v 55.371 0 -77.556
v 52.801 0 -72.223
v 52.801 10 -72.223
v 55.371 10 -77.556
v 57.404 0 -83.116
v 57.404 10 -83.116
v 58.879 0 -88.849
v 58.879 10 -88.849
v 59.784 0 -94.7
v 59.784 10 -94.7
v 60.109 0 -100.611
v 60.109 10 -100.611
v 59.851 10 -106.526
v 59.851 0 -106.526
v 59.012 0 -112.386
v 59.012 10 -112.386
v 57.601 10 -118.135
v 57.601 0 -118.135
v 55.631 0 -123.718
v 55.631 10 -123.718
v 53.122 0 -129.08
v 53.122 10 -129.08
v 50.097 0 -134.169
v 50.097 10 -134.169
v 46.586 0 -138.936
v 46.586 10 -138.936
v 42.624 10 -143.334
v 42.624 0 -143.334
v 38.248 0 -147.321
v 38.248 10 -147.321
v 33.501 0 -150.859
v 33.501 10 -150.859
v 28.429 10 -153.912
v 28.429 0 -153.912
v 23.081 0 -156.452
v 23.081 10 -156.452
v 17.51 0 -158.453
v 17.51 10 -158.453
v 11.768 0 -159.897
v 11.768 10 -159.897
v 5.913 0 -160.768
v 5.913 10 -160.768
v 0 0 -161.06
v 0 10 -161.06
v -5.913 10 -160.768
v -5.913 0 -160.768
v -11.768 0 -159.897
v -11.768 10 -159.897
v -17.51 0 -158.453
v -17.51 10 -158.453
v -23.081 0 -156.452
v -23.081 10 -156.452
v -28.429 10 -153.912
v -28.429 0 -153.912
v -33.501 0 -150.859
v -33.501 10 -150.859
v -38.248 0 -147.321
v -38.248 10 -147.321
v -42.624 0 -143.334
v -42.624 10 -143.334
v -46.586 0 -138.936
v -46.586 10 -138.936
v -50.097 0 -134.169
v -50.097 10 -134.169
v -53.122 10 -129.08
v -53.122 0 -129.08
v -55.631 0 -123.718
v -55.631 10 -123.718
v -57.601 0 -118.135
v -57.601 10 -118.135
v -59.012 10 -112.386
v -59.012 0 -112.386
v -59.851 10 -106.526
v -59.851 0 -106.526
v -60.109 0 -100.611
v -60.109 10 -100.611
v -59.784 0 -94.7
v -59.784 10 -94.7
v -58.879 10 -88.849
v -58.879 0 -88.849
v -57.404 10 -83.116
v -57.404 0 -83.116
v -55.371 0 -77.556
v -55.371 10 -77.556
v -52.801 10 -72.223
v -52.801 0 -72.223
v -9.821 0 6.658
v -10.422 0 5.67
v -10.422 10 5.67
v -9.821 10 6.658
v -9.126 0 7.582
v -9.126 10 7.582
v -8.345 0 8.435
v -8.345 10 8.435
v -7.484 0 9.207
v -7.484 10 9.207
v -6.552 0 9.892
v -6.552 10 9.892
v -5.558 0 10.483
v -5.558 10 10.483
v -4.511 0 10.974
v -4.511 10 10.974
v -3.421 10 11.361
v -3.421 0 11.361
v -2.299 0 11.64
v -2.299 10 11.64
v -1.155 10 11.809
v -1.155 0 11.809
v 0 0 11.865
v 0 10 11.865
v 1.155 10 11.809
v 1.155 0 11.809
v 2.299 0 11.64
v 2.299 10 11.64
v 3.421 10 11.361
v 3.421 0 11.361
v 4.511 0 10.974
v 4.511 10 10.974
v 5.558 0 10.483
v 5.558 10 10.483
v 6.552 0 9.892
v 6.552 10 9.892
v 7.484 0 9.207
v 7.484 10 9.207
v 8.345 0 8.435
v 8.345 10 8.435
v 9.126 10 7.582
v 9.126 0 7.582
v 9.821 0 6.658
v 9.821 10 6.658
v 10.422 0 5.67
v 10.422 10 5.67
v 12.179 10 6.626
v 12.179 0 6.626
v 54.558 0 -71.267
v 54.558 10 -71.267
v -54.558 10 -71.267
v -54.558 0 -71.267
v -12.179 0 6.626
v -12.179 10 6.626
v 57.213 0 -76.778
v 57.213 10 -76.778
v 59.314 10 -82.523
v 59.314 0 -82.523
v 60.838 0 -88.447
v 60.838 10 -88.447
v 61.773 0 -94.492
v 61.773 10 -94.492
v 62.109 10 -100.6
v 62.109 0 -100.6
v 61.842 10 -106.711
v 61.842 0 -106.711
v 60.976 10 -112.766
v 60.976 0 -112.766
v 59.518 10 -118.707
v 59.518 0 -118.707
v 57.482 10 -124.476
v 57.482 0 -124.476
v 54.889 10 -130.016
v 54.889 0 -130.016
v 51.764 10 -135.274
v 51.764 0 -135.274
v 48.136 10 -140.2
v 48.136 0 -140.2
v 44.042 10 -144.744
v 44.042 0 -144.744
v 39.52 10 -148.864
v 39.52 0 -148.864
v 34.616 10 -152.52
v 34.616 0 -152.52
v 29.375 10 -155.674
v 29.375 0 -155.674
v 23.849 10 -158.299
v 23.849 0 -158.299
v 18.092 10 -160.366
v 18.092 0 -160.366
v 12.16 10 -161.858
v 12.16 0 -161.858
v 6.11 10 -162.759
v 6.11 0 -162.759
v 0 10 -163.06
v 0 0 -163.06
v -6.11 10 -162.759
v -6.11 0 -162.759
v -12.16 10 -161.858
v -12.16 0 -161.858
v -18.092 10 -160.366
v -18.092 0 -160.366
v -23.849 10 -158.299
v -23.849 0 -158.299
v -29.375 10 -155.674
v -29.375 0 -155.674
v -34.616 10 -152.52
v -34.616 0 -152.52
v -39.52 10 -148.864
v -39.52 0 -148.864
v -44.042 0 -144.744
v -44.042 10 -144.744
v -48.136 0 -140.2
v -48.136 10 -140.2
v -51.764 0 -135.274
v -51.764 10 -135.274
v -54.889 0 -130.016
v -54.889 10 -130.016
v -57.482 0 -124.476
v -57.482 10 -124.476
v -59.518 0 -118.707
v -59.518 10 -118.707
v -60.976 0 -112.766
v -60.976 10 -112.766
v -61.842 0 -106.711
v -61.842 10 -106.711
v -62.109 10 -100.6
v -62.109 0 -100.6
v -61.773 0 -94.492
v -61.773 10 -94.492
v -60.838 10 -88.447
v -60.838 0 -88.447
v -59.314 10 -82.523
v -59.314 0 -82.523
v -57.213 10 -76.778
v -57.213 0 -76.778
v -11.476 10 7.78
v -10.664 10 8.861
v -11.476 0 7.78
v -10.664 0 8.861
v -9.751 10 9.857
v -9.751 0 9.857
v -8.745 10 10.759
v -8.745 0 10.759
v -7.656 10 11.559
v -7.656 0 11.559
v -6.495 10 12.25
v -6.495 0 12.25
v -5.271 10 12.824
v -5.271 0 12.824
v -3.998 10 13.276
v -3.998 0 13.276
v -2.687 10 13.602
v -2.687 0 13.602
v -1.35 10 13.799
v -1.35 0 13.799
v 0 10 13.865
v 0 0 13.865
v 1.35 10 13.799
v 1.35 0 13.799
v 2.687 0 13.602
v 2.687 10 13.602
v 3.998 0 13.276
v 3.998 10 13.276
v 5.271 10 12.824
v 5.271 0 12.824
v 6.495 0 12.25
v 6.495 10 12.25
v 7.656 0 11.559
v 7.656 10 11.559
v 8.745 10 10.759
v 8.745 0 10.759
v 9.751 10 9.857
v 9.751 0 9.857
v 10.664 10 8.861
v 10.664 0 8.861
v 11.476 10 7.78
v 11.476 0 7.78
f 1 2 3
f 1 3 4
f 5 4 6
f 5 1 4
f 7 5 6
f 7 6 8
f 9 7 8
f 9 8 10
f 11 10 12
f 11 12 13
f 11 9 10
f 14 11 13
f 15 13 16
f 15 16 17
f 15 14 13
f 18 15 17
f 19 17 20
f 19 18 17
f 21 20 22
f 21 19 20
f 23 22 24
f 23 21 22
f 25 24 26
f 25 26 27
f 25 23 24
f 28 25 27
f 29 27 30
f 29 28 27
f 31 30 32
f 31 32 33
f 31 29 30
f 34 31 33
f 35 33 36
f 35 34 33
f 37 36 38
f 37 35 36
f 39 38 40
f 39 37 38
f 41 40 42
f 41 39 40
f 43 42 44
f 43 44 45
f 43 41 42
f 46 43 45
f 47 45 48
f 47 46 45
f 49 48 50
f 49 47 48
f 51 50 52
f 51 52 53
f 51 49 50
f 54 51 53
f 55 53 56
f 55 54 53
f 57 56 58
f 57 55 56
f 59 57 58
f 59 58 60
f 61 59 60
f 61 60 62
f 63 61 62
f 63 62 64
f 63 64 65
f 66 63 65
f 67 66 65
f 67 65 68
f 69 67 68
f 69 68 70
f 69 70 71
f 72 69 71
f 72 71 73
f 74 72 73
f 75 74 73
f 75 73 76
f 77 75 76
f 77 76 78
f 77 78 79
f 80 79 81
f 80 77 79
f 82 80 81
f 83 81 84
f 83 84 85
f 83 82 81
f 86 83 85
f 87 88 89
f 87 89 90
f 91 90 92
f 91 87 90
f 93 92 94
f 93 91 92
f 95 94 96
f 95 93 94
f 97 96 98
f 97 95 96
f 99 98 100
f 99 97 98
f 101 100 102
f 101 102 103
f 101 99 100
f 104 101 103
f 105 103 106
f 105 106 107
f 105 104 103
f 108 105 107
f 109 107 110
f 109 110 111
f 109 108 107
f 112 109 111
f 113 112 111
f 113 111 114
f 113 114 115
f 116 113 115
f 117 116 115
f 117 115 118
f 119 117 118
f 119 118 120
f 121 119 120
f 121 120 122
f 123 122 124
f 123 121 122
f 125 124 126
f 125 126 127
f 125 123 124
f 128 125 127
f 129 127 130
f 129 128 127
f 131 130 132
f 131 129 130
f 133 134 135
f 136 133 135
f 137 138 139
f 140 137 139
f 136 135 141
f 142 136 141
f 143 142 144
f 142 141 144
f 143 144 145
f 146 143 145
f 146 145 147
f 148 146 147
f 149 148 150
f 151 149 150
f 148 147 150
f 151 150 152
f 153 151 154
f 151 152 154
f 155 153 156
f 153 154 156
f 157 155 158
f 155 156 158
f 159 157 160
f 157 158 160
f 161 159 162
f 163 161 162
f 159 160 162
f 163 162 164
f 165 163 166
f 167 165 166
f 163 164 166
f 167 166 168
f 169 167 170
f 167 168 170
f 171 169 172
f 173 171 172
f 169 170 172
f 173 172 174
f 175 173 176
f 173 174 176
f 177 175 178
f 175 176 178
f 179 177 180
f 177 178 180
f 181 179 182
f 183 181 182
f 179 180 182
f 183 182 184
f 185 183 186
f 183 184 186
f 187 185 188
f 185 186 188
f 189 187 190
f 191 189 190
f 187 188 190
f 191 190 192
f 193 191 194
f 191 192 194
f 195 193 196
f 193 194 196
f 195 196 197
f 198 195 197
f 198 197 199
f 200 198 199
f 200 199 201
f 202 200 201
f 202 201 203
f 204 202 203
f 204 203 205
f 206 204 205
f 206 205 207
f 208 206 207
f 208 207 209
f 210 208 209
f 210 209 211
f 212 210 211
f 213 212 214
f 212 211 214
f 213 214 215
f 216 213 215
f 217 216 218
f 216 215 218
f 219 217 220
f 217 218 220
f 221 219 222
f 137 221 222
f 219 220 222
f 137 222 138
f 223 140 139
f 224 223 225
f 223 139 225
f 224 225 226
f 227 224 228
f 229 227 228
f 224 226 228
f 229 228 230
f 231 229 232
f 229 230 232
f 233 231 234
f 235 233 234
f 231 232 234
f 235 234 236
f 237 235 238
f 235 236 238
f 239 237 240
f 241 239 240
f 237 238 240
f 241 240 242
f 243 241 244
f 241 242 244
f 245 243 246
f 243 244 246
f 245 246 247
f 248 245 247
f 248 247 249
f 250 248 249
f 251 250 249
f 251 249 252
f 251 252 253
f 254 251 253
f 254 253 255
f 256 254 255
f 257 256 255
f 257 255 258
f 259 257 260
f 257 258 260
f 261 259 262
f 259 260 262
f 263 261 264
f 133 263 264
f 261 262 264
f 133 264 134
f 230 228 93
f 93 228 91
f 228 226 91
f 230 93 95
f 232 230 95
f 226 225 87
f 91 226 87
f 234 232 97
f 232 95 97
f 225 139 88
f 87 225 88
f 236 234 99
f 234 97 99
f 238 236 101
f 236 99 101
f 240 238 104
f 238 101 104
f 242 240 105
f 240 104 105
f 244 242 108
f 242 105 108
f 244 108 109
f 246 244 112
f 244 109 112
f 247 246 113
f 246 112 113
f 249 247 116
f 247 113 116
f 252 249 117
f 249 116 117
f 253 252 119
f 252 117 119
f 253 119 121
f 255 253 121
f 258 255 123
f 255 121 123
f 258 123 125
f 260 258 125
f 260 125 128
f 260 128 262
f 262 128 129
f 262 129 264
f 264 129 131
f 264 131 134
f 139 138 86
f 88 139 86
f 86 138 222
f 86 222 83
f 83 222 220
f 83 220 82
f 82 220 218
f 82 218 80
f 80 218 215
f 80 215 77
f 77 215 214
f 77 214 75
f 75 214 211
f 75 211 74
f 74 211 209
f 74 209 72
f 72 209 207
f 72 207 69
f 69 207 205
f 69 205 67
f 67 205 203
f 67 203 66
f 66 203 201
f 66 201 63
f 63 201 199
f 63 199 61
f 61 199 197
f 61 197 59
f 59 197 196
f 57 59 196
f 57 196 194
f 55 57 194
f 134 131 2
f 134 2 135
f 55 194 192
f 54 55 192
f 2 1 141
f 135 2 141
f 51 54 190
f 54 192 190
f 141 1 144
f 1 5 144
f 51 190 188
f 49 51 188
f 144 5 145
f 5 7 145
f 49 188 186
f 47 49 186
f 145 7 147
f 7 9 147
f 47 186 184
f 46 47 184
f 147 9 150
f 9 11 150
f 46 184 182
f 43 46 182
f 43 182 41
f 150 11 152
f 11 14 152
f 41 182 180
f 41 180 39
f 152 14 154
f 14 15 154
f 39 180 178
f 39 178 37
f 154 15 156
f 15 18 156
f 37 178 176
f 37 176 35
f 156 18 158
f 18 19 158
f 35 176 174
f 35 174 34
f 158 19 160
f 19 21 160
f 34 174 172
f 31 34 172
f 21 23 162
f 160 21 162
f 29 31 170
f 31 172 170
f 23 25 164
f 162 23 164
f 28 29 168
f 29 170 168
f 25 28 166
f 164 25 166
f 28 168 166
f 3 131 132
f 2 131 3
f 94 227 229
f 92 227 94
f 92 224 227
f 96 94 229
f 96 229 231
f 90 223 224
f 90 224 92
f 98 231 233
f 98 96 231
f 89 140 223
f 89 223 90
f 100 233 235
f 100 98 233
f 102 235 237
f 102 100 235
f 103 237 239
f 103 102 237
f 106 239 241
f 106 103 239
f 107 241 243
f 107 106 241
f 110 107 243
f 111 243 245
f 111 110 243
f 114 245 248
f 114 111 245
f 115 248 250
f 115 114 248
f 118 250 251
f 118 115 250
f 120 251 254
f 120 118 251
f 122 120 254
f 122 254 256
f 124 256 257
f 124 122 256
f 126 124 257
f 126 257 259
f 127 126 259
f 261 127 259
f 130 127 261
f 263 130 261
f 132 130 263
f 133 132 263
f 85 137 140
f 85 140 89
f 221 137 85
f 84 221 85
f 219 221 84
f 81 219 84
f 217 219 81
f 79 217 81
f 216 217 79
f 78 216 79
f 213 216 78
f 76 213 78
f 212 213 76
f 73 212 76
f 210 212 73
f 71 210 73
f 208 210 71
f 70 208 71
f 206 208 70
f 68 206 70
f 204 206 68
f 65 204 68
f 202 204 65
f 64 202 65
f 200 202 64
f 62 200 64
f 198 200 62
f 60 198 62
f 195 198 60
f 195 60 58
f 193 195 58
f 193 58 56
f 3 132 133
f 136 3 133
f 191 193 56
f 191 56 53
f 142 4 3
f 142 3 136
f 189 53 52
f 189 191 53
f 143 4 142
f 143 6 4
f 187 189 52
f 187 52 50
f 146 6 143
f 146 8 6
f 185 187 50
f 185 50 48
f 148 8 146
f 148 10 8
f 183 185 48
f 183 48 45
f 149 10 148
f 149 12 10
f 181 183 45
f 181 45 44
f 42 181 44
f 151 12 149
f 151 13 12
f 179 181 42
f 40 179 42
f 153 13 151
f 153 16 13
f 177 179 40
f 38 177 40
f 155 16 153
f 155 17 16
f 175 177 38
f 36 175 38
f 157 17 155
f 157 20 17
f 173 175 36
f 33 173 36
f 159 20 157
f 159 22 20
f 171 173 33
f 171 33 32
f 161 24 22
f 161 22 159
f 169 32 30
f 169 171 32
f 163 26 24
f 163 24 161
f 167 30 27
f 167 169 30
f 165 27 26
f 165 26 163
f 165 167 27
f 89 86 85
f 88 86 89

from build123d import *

# Parameters (mm, degrees)
EXTRUDE_1_DEPTH = 10


with BuildPart() as part:
    # 草图1 → 凸台-拉伸1 (new body)
    with BuildSketch(Plane(origin=(0, 0, 0), x_dir=(1, 0, 0), z_dir=(0, 1, 0))):
        with BuildLine():
            Line((12.17913919, -6.626220158), (54.557975845, 71.267018821))
            ThreePointArc((54.557975845, 71.267018821), (0, 163.06), (-54.557975845, 71.267018821))
            Line((-54.557975845, 71.267018821), (-12.17913919, -6.626220158))
            ThreePointArc((-12.17913919, -6.626220158), (0, -13.865), (12.17913919, -6.626220158))
        make_face()
        with BuildLine():
            ThreePointArc((52.801158075, 72.222838534), (0, 161.06), (-52.801158075, 72.222838534))
            Line((-52.801158075, 72.222838534), (-10.42232142, -5.670400446))
            ThreePointArc((-10.42232142, -5.670400446), (0, -11.865), (10.42232142, -5.670400446))
            Line((10.42232142, -5.670400446), (52.801158075, 72.222838534))
        make_face(mode=Mode.SUBTRACT)
    extrude(amount=EXTRUDE_1_DEPTH)


solid = part.part
